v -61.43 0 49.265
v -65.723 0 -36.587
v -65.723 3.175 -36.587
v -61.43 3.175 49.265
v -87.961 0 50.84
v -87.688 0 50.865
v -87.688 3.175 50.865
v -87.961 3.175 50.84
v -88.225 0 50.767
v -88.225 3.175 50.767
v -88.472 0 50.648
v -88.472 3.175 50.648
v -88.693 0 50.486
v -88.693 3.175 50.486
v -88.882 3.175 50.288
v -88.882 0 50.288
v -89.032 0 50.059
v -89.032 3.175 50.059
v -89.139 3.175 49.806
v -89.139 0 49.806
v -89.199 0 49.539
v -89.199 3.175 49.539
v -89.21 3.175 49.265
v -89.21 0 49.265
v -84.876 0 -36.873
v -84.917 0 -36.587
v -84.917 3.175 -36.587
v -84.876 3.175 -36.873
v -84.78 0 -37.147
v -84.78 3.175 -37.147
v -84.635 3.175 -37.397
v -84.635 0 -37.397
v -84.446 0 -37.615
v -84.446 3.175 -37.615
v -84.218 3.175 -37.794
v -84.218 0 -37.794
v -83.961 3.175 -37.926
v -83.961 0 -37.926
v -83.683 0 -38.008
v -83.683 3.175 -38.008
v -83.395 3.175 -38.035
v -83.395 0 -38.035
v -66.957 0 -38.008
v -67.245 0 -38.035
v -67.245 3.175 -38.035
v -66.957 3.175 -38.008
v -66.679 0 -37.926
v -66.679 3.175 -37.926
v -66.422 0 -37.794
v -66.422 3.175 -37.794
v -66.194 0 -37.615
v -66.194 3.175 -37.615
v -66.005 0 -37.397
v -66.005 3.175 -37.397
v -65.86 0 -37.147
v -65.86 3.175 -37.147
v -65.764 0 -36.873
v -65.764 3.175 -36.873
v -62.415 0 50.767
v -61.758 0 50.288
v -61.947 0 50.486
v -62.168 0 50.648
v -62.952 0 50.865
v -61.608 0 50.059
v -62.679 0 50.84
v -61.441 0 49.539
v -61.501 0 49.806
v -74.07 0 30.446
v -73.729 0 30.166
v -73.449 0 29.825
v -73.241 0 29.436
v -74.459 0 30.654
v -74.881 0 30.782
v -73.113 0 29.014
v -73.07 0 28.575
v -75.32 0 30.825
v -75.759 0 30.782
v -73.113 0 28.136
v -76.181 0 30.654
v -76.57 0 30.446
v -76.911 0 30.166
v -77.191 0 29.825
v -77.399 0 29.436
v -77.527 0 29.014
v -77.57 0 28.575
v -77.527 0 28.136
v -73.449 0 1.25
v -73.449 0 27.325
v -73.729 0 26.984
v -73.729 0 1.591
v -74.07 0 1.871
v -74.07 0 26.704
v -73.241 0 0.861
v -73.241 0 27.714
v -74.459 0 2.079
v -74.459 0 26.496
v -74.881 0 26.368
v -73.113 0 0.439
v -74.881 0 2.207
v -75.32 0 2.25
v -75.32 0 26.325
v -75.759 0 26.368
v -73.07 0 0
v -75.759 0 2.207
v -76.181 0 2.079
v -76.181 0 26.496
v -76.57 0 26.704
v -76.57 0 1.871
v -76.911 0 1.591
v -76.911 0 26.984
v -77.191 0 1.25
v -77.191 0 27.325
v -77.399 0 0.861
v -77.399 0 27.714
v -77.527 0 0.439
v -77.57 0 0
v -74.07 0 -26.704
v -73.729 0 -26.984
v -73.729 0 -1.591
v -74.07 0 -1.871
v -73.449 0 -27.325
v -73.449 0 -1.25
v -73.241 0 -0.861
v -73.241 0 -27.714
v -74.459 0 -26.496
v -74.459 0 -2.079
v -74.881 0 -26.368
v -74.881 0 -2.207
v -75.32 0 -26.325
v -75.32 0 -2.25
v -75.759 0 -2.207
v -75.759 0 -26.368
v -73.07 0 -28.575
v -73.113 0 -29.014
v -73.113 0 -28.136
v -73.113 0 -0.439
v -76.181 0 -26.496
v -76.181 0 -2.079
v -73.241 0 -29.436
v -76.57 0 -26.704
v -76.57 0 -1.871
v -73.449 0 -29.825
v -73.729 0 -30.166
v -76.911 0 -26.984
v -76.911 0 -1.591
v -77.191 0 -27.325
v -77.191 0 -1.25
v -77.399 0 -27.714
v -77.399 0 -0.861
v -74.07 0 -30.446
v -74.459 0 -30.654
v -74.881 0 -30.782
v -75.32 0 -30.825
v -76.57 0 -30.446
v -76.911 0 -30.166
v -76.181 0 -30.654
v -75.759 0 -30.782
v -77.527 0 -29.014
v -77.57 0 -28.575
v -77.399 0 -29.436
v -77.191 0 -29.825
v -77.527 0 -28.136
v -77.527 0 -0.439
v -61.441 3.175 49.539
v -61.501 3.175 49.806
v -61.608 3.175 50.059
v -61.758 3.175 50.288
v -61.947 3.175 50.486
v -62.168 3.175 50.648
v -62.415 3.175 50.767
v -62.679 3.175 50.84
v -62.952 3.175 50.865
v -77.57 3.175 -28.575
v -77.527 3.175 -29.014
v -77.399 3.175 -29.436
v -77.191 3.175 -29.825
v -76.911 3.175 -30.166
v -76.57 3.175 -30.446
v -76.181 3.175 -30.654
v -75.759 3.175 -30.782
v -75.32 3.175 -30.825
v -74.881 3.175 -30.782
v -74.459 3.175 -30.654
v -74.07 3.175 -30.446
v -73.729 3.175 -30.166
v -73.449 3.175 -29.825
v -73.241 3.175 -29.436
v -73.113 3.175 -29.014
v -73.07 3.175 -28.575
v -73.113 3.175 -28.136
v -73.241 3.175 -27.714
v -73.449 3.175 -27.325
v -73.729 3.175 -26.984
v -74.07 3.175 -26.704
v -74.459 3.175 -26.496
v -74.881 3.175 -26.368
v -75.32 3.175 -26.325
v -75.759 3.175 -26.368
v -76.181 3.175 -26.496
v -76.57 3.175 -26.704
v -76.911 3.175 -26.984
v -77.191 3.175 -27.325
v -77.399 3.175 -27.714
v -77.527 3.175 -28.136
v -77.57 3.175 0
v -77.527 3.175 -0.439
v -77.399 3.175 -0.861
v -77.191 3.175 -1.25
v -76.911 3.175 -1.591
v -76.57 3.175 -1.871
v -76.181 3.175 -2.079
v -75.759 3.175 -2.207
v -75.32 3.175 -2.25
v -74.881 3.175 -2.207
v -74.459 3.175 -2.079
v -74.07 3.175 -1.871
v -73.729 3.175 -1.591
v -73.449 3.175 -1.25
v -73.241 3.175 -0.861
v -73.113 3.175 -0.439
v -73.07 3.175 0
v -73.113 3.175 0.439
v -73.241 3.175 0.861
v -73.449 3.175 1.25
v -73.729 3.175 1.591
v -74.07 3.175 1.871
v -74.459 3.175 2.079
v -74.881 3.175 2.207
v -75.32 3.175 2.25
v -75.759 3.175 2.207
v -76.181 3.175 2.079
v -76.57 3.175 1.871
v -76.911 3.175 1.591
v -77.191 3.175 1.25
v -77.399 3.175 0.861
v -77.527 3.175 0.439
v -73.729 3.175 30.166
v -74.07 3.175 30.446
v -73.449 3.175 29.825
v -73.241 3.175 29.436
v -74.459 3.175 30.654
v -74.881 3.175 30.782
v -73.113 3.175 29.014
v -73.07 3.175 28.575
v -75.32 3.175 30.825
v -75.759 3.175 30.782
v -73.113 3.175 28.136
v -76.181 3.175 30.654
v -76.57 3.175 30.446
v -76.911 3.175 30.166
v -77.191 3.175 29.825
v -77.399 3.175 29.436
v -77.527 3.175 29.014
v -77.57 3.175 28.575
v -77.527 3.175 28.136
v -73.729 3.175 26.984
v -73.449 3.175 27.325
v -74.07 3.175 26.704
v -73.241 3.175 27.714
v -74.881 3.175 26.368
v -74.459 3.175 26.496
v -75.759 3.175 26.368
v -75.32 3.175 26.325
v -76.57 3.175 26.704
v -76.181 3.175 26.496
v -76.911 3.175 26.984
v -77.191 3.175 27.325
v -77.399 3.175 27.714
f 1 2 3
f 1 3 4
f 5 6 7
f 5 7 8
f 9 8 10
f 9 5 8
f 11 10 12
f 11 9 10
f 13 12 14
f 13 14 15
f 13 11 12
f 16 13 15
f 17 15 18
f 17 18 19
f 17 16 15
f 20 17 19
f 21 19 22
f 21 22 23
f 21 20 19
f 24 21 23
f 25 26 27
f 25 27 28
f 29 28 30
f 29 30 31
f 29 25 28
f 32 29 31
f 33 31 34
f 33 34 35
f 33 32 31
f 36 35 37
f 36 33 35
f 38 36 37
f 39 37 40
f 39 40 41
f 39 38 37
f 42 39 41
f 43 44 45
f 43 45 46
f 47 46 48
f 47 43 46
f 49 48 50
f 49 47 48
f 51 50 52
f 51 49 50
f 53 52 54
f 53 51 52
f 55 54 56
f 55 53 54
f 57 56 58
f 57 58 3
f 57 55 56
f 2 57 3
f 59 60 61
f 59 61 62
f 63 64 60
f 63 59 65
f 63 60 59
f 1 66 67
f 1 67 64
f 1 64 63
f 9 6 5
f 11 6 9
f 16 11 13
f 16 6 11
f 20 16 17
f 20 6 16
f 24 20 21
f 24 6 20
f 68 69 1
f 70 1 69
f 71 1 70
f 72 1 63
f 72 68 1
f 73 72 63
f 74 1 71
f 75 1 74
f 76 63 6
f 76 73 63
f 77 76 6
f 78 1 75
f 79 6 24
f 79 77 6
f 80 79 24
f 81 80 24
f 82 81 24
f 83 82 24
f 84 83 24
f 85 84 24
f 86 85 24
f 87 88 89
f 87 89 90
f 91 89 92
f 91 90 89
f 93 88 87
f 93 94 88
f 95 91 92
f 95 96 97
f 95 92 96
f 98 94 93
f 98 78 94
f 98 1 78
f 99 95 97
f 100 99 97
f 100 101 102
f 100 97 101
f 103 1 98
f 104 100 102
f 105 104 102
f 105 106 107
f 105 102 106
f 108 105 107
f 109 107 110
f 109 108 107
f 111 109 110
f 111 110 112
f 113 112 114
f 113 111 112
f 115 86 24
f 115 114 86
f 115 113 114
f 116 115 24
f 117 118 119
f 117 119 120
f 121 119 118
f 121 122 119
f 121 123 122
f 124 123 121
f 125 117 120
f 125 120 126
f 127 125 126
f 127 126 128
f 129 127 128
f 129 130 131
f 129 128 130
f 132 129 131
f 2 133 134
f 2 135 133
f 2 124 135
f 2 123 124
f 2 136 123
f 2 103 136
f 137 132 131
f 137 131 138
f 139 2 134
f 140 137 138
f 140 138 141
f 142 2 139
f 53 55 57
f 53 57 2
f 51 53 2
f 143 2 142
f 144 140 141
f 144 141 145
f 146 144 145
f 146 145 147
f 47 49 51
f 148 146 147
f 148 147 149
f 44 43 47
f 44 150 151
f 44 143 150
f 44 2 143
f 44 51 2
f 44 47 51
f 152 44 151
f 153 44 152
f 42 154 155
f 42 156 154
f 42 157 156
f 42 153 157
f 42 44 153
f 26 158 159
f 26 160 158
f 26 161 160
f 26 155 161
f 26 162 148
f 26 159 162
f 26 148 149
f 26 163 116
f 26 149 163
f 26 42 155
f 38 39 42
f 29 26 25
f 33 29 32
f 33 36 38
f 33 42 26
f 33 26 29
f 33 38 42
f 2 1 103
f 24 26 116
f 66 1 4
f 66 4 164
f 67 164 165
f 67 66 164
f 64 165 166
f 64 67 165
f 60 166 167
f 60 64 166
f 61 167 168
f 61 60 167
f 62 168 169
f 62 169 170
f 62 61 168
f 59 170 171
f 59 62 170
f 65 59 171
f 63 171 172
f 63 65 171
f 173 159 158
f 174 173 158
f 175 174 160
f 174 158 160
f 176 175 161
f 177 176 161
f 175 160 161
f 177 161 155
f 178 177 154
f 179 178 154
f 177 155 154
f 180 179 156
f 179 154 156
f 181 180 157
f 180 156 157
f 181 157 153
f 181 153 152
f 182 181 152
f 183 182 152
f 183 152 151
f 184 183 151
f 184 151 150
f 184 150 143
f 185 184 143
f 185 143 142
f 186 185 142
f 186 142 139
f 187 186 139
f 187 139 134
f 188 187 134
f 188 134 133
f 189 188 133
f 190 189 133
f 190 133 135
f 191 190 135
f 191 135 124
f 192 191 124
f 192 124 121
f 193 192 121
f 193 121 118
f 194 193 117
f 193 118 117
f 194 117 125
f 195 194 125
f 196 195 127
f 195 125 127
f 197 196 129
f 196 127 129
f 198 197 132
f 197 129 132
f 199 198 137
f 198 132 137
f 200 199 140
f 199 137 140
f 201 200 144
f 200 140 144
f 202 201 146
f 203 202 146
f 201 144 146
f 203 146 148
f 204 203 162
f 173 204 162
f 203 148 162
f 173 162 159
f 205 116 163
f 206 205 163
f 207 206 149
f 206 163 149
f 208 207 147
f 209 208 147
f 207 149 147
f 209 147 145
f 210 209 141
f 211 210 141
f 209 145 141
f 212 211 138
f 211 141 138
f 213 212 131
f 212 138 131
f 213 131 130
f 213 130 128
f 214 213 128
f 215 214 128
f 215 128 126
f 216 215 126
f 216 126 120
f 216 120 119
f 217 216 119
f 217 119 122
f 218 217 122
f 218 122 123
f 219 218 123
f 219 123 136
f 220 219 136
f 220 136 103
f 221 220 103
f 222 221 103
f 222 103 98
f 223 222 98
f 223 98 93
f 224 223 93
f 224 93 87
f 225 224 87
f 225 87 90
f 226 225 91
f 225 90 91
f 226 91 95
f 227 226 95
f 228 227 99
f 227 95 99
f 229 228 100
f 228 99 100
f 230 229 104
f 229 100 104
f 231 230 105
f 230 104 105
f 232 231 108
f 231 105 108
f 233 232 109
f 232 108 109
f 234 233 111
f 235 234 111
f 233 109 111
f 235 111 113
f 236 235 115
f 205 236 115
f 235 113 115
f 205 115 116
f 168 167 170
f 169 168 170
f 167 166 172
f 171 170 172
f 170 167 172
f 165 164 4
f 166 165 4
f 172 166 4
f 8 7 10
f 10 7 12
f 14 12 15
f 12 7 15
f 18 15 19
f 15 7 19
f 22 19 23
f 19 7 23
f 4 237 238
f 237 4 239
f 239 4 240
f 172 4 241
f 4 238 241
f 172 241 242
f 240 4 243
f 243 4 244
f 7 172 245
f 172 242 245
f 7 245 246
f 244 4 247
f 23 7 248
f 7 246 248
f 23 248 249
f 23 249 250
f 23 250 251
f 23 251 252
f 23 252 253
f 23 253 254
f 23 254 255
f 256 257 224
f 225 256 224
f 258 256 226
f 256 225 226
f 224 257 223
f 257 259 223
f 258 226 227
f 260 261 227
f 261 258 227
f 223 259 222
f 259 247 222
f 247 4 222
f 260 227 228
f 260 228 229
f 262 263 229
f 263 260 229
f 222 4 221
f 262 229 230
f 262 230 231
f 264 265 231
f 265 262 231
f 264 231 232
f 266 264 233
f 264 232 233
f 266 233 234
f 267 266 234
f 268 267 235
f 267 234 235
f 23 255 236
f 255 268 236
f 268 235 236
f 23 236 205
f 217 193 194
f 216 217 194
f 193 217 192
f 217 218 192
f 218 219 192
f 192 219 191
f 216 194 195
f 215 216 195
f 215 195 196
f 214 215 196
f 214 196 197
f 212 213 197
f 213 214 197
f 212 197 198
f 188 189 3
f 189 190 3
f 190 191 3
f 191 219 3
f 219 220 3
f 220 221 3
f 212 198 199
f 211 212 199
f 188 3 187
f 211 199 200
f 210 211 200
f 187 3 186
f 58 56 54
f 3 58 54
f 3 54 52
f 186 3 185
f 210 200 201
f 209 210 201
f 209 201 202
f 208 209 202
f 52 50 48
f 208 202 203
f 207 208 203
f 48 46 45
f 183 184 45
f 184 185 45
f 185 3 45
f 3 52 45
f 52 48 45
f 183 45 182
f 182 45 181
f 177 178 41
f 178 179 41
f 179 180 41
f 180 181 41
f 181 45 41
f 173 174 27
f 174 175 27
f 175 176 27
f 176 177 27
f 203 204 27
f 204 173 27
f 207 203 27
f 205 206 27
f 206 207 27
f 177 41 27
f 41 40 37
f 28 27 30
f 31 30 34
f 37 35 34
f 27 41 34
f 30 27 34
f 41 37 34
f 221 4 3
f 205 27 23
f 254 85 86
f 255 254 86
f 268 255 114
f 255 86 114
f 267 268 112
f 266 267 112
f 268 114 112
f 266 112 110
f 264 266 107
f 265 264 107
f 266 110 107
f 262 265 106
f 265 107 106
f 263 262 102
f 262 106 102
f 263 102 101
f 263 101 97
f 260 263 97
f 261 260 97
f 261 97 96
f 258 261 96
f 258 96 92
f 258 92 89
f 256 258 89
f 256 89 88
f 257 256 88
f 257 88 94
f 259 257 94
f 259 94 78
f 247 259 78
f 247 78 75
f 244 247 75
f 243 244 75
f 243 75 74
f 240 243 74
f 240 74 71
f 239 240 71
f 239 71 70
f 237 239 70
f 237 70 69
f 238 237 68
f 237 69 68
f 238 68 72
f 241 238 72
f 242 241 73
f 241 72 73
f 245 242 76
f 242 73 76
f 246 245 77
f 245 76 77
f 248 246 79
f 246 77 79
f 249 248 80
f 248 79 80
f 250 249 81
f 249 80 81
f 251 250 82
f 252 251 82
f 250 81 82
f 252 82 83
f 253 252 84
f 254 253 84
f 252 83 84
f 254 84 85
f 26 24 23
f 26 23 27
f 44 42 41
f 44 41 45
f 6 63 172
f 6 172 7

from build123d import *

# Parameters (mm, degrees)
BOSS_EXTRUDE1_DEPTH  = 3.175
M4_CLEARANCE_HOLE1_D = 4.5


with BuildPart() as part:
    # Sketch1 → Boss-Extrude1 (new body)
    with BuildSketch(Plane(origin=(0, 0, 0), x_dir=(1, 0, 0), z_dir=(0, 1, 0))):
        with BuildLine():
            Line((-75.32, 38.035000003), (-67.244703811, 38.035000003))
            ThreePointArc((-67.244703811, 38.035000003), (-66.19432481, 37.615210108), (-65.722605246, 36.587104931))
            Line((-65.722605246, 36.587104931), (-61.430005246, -49.264895069))
            ThreePointArc((-61.430005246, -49.264895069), (-61.847893706, -50.391378998), (-62.952103811, -50.864999997))
            Line((-62.952103811, -50.864999997), (-75.32, -50.864999997))
            Line((-75.32, -50.864999997), (-87.687896189, -50.864999997))
            ThreePointArc((-87.687896189, -50.864999997), (-88.792106294, -50.391378998), (-89.209994754, -49.264895069))
            Line((-89.209994754, -49.264895069), (-84.917394754, 36.587104931))
            ThreePointArc((-84.917394754, 36.587104931), (-84.44567519, 37.615210108), (-83.395296189, 38.035000003))
            Line((-83.395296189, 38.035000003), (-75.32, 38.035000003))
        make_face()
    extrude(amount=BOSS_EXTRUDE1_DEPTH)

    # M4 Clearance Hole1 (through all)
    with Locations(Plane(origin=(0, 3.175, 0), x_dir=(1, 0, 0), z_dir=(0, 1, 0))):
        with Locations((-75.32, 28.575), (-75.32, 0), (-75.32, -28.575)):
            Hole(M4_CLEARANCE_HOLE1_D / 2)


solid = part.part
